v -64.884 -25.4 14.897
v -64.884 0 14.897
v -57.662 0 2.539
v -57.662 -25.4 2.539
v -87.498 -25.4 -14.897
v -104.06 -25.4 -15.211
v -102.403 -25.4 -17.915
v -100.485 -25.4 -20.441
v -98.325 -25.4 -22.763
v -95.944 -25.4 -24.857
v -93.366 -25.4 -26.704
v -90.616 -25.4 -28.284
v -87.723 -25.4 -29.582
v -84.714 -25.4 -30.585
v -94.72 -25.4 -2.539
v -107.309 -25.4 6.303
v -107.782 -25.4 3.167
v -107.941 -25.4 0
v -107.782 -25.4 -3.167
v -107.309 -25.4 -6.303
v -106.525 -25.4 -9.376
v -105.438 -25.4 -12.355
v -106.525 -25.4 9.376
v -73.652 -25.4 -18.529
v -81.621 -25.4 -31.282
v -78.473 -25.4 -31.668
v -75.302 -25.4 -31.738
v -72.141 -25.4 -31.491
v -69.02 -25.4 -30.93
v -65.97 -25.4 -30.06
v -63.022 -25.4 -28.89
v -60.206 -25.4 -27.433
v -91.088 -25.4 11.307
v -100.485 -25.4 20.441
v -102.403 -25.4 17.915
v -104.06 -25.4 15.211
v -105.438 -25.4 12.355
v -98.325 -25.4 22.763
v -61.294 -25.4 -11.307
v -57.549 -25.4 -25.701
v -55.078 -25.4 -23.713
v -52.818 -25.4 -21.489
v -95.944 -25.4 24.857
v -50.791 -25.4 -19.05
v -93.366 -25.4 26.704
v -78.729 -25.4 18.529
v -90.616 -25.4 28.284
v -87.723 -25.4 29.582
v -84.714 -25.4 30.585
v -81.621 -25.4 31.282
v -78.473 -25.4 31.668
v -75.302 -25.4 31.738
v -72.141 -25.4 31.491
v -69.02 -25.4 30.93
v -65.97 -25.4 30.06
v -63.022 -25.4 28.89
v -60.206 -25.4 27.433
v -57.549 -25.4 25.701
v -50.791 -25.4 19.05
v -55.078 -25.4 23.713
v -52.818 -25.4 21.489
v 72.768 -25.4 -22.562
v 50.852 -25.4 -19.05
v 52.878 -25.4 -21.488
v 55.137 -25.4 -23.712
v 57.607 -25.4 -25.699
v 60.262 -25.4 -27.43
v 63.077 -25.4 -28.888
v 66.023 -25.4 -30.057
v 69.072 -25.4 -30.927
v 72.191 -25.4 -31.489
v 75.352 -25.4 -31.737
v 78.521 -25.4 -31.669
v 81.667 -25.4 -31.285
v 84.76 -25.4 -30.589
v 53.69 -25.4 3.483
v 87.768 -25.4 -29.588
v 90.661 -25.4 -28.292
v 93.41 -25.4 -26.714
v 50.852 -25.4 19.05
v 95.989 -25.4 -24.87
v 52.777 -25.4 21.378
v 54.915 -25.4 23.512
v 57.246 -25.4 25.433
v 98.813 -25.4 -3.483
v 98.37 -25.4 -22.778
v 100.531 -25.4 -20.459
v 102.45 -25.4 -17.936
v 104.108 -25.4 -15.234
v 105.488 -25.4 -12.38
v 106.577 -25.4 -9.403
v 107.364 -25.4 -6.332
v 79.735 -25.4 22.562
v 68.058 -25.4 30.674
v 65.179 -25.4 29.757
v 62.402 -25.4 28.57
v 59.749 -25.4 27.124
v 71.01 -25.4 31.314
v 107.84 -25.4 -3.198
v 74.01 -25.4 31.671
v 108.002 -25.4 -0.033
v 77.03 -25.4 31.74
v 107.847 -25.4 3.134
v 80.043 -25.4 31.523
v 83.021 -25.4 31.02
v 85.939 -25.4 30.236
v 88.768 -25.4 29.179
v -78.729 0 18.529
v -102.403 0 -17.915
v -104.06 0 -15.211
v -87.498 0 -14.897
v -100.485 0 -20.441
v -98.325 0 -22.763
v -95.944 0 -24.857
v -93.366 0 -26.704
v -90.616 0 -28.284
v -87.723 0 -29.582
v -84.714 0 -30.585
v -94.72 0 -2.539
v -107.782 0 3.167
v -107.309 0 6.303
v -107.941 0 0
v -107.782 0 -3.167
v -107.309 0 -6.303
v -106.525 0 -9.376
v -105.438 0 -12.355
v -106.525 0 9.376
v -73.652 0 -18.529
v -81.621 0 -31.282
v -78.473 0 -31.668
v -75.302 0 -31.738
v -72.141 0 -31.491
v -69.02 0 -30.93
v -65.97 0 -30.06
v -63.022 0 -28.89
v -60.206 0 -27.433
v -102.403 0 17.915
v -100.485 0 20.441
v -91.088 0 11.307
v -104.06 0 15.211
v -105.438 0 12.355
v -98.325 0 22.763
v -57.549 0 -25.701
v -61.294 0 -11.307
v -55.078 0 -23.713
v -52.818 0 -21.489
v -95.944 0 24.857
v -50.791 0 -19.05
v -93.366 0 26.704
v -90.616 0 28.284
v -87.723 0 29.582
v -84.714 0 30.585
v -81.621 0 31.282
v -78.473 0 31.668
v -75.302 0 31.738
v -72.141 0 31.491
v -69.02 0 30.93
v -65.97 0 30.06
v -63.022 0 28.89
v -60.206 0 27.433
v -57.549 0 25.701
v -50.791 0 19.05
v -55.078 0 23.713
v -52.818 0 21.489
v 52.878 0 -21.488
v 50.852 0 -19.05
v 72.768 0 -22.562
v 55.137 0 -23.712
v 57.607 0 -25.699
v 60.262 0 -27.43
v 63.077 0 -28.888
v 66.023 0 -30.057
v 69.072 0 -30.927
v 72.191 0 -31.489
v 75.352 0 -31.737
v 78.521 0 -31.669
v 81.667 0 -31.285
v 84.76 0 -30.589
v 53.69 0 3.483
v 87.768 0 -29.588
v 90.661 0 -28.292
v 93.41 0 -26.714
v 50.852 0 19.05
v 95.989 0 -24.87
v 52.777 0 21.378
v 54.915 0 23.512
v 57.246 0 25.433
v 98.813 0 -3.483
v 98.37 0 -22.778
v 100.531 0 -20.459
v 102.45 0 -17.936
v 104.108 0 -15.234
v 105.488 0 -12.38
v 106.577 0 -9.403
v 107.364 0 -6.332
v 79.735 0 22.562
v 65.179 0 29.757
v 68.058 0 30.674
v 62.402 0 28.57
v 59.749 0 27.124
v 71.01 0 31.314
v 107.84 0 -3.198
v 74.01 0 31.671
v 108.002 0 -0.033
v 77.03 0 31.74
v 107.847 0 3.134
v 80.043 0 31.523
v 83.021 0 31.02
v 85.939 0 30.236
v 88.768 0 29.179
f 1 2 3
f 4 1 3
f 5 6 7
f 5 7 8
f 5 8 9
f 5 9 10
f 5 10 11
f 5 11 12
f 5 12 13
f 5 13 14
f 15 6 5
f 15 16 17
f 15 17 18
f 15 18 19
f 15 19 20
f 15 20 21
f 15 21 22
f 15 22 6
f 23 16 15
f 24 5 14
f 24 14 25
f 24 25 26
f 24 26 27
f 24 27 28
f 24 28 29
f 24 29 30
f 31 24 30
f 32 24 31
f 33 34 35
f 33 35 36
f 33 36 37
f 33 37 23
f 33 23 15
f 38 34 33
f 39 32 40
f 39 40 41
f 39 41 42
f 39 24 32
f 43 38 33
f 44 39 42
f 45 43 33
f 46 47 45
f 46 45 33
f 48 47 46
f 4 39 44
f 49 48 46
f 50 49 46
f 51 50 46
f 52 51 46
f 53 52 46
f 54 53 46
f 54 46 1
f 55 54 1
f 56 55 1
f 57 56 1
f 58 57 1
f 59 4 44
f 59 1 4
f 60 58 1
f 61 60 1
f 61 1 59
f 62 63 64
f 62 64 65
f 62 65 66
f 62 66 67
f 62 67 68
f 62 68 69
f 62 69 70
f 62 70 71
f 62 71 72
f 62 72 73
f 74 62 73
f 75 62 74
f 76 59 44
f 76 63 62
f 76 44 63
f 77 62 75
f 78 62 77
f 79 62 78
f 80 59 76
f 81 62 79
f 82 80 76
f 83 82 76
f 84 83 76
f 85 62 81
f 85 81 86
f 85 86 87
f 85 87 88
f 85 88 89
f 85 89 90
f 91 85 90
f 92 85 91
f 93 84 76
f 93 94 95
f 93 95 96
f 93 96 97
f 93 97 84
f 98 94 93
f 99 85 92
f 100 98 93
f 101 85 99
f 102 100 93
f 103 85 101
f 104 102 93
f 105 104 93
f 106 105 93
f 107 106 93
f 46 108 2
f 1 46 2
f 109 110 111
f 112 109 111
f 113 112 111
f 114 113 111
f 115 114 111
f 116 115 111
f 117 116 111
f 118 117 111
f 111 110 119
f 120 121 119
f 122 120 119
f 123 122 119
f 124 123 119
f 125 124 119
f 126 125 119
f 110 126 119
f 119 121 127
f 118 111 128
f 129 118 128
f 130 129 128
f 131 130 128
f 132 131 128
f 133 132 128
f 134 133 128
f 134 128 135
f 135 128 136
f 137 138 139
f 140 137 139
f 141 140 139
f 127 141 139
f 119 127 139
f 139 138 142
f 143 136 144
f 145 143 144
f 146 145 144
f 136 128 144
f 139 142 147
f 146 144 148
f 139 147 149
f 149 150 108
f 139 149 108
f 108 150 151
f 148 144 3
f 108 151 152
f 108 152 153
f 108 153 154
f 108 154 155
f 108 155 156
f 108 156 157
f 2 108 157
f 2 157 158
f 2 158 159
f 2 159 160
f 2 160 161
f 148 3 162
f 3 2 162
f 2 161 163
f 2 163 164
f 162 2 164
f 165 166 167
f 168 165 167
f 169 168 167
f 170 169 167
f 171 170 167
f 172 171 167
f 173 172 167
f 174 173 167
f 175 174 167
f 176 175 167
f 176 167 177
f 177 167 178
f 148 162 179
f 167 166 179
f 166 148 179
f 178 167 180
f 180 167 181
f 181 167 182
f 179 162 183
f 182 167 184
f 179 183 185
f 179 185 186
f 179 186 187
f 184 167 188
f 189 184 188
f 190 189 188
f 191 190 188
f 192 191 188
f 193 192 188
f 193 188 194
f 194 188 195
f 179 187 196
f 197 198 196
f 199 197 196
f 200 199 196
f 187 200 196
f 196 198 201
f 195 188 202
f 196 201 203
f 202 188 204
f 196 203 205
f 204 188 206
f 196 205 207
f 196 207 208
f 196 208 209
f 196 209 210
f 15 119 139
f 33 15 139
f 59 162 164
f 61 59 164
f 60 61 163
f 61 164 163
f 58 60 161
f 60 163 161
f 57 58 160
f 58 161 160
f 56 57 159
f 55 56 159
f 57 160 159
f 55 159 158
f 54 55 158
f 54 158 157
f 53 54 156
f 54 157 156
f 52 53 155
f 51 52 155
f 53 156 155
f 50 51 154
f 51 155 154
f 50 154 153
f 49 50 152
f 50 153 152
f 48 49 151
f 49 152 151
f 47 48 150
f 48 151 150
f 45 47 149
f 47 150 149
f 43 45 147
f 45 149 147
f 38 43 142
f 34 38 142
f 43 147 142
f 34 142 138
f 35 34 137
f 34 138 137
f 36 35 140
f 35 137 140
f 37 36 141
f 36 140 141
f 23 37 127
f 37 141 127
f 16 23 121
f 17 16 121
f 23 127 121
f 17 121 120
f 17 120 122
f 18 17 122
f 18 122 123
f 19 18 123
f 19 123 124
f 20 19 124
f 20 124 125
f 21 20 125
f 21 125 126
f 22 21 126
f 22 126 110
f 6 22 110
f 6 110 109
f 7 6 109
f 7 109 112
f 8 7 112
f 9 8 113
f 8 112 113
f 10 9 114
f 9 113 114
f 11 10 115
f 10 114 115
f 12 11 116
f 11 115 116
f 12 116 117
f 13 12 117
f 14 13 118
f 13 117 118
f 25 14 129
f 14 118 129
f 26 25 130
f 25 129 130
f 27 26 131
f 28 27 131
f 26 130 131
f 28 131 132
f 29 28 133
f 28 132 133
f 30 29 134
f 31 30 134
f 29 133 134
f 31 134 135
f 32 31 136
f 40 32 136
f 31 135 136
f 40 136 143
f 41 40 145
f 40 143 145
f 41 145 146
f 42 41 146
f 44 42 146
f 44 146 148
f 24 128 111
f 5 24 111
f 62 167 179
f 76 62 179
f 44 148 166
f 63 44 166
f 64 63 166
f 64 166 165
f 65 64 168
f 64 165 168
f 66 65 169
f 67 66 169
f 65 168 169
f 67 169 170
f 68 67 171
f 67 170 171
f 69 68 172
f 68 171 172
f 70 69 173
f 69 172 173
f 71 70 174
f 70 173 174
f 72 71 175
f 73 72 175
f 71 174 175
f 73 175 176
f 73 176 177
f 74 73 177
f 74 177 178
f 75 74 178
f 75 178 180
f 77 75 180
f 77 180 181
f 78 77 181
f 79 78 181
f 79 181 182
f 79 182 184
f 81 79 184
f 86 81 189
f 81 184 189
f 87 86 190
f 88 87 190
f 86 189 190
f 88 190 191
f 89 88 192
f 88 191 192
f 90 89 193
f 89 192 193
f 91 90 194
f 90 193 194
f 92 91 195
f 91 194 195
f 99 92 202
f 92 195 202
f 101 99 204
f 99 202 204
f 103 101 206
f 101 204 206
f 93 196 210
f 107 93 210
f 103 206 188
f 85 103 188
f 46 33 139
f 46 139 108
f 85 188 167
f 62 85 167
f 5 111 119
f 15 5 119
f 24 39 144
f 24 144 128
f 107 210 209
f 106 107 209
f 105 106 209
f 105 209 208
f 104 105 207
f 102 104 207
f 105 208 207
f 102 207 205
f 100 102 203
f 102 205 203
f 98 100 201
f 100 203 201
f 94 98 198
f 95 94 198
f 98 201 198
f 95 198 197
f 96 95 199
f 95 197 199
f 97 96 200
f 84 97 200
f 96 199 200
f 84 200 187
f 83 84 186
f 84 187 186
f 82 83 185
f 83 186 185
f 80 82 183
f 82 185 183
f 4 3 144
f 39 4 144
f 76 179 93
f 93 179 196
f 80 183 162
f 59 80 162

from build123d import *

# Parameters (mm, degrees)
F1_DEPTH = 25.4


with BuildPart() as f1:
    # F0 (on Front) → F1 (new body)
    with BuildSketch(Plane.XZ):
        with BuildLine():
            ThreePointArc((-50.790703, -19.05), (-46.070008, -10.040232), (-44.440703, 0))
            ThreePointArc((-44.440703, 0), (-46.070008, 10.040232), (-50.790703, 19.05))
            ThreePointArc((-50.790703, 19.05), (-107.940703, 0), (-50.790703, -19.05))
        make_face()
        Polygon((-78.729237, 18.529119), (-64.883652, 14.897081), (-57.661583, 2.538535), (-61.293621, -11.307051), (-73.652168, -18.529119), (-87.497754, -14.897081), (-94.719822, -2.538535), (-91.087784, 11.307051), align=None, mode=Mode.SUBTRACT)
        with BuildLine():
            ThreePointArc((-50.790703, 19.05), (-46.070008, 10.040232), (-44.440703, 0))
            ThreePointArc((-44.440703, 0), (-46.070008, -10.040232), (-50.790703, -19.05))
            Line((-50.790703, -19.05), (50.851671, -19.05))
            ThreePointArc((50.851671, -19.05), (44.501671, 0), (50.851671, 19.05))
            Line((50.851671, 19.05), (-50.790703, 19.05))
        make_face()
        with BuildLine():
            ThreePointArc((88.768213, 29.178737), (68.057545, 30.6744), (50.851671, 19.05))
            ThreePointArc((50.851671, 19.05), (44.501671, 0), (50.851671, -19.05))
            ThreePointArc((50.851671, -19.05), (87.767851, -29.587837), (107.846656, 3.133593))
            Line((107.846656, 3.133593), (98.813464, -3.48335))
            Line((98.813464, -3.48335), (72.76832, -22.561793))
            Line((72.76832, -22.561793), (53.689878, 3.48335))
            Line((53.689878, 3.48335), (79.735021, 22.561793))
            Line((79.735021, 22.561793), (88.768213, 29.178737))
        make_face()
    extrude(amount=F1_DEPTH)


solid = f1.part
